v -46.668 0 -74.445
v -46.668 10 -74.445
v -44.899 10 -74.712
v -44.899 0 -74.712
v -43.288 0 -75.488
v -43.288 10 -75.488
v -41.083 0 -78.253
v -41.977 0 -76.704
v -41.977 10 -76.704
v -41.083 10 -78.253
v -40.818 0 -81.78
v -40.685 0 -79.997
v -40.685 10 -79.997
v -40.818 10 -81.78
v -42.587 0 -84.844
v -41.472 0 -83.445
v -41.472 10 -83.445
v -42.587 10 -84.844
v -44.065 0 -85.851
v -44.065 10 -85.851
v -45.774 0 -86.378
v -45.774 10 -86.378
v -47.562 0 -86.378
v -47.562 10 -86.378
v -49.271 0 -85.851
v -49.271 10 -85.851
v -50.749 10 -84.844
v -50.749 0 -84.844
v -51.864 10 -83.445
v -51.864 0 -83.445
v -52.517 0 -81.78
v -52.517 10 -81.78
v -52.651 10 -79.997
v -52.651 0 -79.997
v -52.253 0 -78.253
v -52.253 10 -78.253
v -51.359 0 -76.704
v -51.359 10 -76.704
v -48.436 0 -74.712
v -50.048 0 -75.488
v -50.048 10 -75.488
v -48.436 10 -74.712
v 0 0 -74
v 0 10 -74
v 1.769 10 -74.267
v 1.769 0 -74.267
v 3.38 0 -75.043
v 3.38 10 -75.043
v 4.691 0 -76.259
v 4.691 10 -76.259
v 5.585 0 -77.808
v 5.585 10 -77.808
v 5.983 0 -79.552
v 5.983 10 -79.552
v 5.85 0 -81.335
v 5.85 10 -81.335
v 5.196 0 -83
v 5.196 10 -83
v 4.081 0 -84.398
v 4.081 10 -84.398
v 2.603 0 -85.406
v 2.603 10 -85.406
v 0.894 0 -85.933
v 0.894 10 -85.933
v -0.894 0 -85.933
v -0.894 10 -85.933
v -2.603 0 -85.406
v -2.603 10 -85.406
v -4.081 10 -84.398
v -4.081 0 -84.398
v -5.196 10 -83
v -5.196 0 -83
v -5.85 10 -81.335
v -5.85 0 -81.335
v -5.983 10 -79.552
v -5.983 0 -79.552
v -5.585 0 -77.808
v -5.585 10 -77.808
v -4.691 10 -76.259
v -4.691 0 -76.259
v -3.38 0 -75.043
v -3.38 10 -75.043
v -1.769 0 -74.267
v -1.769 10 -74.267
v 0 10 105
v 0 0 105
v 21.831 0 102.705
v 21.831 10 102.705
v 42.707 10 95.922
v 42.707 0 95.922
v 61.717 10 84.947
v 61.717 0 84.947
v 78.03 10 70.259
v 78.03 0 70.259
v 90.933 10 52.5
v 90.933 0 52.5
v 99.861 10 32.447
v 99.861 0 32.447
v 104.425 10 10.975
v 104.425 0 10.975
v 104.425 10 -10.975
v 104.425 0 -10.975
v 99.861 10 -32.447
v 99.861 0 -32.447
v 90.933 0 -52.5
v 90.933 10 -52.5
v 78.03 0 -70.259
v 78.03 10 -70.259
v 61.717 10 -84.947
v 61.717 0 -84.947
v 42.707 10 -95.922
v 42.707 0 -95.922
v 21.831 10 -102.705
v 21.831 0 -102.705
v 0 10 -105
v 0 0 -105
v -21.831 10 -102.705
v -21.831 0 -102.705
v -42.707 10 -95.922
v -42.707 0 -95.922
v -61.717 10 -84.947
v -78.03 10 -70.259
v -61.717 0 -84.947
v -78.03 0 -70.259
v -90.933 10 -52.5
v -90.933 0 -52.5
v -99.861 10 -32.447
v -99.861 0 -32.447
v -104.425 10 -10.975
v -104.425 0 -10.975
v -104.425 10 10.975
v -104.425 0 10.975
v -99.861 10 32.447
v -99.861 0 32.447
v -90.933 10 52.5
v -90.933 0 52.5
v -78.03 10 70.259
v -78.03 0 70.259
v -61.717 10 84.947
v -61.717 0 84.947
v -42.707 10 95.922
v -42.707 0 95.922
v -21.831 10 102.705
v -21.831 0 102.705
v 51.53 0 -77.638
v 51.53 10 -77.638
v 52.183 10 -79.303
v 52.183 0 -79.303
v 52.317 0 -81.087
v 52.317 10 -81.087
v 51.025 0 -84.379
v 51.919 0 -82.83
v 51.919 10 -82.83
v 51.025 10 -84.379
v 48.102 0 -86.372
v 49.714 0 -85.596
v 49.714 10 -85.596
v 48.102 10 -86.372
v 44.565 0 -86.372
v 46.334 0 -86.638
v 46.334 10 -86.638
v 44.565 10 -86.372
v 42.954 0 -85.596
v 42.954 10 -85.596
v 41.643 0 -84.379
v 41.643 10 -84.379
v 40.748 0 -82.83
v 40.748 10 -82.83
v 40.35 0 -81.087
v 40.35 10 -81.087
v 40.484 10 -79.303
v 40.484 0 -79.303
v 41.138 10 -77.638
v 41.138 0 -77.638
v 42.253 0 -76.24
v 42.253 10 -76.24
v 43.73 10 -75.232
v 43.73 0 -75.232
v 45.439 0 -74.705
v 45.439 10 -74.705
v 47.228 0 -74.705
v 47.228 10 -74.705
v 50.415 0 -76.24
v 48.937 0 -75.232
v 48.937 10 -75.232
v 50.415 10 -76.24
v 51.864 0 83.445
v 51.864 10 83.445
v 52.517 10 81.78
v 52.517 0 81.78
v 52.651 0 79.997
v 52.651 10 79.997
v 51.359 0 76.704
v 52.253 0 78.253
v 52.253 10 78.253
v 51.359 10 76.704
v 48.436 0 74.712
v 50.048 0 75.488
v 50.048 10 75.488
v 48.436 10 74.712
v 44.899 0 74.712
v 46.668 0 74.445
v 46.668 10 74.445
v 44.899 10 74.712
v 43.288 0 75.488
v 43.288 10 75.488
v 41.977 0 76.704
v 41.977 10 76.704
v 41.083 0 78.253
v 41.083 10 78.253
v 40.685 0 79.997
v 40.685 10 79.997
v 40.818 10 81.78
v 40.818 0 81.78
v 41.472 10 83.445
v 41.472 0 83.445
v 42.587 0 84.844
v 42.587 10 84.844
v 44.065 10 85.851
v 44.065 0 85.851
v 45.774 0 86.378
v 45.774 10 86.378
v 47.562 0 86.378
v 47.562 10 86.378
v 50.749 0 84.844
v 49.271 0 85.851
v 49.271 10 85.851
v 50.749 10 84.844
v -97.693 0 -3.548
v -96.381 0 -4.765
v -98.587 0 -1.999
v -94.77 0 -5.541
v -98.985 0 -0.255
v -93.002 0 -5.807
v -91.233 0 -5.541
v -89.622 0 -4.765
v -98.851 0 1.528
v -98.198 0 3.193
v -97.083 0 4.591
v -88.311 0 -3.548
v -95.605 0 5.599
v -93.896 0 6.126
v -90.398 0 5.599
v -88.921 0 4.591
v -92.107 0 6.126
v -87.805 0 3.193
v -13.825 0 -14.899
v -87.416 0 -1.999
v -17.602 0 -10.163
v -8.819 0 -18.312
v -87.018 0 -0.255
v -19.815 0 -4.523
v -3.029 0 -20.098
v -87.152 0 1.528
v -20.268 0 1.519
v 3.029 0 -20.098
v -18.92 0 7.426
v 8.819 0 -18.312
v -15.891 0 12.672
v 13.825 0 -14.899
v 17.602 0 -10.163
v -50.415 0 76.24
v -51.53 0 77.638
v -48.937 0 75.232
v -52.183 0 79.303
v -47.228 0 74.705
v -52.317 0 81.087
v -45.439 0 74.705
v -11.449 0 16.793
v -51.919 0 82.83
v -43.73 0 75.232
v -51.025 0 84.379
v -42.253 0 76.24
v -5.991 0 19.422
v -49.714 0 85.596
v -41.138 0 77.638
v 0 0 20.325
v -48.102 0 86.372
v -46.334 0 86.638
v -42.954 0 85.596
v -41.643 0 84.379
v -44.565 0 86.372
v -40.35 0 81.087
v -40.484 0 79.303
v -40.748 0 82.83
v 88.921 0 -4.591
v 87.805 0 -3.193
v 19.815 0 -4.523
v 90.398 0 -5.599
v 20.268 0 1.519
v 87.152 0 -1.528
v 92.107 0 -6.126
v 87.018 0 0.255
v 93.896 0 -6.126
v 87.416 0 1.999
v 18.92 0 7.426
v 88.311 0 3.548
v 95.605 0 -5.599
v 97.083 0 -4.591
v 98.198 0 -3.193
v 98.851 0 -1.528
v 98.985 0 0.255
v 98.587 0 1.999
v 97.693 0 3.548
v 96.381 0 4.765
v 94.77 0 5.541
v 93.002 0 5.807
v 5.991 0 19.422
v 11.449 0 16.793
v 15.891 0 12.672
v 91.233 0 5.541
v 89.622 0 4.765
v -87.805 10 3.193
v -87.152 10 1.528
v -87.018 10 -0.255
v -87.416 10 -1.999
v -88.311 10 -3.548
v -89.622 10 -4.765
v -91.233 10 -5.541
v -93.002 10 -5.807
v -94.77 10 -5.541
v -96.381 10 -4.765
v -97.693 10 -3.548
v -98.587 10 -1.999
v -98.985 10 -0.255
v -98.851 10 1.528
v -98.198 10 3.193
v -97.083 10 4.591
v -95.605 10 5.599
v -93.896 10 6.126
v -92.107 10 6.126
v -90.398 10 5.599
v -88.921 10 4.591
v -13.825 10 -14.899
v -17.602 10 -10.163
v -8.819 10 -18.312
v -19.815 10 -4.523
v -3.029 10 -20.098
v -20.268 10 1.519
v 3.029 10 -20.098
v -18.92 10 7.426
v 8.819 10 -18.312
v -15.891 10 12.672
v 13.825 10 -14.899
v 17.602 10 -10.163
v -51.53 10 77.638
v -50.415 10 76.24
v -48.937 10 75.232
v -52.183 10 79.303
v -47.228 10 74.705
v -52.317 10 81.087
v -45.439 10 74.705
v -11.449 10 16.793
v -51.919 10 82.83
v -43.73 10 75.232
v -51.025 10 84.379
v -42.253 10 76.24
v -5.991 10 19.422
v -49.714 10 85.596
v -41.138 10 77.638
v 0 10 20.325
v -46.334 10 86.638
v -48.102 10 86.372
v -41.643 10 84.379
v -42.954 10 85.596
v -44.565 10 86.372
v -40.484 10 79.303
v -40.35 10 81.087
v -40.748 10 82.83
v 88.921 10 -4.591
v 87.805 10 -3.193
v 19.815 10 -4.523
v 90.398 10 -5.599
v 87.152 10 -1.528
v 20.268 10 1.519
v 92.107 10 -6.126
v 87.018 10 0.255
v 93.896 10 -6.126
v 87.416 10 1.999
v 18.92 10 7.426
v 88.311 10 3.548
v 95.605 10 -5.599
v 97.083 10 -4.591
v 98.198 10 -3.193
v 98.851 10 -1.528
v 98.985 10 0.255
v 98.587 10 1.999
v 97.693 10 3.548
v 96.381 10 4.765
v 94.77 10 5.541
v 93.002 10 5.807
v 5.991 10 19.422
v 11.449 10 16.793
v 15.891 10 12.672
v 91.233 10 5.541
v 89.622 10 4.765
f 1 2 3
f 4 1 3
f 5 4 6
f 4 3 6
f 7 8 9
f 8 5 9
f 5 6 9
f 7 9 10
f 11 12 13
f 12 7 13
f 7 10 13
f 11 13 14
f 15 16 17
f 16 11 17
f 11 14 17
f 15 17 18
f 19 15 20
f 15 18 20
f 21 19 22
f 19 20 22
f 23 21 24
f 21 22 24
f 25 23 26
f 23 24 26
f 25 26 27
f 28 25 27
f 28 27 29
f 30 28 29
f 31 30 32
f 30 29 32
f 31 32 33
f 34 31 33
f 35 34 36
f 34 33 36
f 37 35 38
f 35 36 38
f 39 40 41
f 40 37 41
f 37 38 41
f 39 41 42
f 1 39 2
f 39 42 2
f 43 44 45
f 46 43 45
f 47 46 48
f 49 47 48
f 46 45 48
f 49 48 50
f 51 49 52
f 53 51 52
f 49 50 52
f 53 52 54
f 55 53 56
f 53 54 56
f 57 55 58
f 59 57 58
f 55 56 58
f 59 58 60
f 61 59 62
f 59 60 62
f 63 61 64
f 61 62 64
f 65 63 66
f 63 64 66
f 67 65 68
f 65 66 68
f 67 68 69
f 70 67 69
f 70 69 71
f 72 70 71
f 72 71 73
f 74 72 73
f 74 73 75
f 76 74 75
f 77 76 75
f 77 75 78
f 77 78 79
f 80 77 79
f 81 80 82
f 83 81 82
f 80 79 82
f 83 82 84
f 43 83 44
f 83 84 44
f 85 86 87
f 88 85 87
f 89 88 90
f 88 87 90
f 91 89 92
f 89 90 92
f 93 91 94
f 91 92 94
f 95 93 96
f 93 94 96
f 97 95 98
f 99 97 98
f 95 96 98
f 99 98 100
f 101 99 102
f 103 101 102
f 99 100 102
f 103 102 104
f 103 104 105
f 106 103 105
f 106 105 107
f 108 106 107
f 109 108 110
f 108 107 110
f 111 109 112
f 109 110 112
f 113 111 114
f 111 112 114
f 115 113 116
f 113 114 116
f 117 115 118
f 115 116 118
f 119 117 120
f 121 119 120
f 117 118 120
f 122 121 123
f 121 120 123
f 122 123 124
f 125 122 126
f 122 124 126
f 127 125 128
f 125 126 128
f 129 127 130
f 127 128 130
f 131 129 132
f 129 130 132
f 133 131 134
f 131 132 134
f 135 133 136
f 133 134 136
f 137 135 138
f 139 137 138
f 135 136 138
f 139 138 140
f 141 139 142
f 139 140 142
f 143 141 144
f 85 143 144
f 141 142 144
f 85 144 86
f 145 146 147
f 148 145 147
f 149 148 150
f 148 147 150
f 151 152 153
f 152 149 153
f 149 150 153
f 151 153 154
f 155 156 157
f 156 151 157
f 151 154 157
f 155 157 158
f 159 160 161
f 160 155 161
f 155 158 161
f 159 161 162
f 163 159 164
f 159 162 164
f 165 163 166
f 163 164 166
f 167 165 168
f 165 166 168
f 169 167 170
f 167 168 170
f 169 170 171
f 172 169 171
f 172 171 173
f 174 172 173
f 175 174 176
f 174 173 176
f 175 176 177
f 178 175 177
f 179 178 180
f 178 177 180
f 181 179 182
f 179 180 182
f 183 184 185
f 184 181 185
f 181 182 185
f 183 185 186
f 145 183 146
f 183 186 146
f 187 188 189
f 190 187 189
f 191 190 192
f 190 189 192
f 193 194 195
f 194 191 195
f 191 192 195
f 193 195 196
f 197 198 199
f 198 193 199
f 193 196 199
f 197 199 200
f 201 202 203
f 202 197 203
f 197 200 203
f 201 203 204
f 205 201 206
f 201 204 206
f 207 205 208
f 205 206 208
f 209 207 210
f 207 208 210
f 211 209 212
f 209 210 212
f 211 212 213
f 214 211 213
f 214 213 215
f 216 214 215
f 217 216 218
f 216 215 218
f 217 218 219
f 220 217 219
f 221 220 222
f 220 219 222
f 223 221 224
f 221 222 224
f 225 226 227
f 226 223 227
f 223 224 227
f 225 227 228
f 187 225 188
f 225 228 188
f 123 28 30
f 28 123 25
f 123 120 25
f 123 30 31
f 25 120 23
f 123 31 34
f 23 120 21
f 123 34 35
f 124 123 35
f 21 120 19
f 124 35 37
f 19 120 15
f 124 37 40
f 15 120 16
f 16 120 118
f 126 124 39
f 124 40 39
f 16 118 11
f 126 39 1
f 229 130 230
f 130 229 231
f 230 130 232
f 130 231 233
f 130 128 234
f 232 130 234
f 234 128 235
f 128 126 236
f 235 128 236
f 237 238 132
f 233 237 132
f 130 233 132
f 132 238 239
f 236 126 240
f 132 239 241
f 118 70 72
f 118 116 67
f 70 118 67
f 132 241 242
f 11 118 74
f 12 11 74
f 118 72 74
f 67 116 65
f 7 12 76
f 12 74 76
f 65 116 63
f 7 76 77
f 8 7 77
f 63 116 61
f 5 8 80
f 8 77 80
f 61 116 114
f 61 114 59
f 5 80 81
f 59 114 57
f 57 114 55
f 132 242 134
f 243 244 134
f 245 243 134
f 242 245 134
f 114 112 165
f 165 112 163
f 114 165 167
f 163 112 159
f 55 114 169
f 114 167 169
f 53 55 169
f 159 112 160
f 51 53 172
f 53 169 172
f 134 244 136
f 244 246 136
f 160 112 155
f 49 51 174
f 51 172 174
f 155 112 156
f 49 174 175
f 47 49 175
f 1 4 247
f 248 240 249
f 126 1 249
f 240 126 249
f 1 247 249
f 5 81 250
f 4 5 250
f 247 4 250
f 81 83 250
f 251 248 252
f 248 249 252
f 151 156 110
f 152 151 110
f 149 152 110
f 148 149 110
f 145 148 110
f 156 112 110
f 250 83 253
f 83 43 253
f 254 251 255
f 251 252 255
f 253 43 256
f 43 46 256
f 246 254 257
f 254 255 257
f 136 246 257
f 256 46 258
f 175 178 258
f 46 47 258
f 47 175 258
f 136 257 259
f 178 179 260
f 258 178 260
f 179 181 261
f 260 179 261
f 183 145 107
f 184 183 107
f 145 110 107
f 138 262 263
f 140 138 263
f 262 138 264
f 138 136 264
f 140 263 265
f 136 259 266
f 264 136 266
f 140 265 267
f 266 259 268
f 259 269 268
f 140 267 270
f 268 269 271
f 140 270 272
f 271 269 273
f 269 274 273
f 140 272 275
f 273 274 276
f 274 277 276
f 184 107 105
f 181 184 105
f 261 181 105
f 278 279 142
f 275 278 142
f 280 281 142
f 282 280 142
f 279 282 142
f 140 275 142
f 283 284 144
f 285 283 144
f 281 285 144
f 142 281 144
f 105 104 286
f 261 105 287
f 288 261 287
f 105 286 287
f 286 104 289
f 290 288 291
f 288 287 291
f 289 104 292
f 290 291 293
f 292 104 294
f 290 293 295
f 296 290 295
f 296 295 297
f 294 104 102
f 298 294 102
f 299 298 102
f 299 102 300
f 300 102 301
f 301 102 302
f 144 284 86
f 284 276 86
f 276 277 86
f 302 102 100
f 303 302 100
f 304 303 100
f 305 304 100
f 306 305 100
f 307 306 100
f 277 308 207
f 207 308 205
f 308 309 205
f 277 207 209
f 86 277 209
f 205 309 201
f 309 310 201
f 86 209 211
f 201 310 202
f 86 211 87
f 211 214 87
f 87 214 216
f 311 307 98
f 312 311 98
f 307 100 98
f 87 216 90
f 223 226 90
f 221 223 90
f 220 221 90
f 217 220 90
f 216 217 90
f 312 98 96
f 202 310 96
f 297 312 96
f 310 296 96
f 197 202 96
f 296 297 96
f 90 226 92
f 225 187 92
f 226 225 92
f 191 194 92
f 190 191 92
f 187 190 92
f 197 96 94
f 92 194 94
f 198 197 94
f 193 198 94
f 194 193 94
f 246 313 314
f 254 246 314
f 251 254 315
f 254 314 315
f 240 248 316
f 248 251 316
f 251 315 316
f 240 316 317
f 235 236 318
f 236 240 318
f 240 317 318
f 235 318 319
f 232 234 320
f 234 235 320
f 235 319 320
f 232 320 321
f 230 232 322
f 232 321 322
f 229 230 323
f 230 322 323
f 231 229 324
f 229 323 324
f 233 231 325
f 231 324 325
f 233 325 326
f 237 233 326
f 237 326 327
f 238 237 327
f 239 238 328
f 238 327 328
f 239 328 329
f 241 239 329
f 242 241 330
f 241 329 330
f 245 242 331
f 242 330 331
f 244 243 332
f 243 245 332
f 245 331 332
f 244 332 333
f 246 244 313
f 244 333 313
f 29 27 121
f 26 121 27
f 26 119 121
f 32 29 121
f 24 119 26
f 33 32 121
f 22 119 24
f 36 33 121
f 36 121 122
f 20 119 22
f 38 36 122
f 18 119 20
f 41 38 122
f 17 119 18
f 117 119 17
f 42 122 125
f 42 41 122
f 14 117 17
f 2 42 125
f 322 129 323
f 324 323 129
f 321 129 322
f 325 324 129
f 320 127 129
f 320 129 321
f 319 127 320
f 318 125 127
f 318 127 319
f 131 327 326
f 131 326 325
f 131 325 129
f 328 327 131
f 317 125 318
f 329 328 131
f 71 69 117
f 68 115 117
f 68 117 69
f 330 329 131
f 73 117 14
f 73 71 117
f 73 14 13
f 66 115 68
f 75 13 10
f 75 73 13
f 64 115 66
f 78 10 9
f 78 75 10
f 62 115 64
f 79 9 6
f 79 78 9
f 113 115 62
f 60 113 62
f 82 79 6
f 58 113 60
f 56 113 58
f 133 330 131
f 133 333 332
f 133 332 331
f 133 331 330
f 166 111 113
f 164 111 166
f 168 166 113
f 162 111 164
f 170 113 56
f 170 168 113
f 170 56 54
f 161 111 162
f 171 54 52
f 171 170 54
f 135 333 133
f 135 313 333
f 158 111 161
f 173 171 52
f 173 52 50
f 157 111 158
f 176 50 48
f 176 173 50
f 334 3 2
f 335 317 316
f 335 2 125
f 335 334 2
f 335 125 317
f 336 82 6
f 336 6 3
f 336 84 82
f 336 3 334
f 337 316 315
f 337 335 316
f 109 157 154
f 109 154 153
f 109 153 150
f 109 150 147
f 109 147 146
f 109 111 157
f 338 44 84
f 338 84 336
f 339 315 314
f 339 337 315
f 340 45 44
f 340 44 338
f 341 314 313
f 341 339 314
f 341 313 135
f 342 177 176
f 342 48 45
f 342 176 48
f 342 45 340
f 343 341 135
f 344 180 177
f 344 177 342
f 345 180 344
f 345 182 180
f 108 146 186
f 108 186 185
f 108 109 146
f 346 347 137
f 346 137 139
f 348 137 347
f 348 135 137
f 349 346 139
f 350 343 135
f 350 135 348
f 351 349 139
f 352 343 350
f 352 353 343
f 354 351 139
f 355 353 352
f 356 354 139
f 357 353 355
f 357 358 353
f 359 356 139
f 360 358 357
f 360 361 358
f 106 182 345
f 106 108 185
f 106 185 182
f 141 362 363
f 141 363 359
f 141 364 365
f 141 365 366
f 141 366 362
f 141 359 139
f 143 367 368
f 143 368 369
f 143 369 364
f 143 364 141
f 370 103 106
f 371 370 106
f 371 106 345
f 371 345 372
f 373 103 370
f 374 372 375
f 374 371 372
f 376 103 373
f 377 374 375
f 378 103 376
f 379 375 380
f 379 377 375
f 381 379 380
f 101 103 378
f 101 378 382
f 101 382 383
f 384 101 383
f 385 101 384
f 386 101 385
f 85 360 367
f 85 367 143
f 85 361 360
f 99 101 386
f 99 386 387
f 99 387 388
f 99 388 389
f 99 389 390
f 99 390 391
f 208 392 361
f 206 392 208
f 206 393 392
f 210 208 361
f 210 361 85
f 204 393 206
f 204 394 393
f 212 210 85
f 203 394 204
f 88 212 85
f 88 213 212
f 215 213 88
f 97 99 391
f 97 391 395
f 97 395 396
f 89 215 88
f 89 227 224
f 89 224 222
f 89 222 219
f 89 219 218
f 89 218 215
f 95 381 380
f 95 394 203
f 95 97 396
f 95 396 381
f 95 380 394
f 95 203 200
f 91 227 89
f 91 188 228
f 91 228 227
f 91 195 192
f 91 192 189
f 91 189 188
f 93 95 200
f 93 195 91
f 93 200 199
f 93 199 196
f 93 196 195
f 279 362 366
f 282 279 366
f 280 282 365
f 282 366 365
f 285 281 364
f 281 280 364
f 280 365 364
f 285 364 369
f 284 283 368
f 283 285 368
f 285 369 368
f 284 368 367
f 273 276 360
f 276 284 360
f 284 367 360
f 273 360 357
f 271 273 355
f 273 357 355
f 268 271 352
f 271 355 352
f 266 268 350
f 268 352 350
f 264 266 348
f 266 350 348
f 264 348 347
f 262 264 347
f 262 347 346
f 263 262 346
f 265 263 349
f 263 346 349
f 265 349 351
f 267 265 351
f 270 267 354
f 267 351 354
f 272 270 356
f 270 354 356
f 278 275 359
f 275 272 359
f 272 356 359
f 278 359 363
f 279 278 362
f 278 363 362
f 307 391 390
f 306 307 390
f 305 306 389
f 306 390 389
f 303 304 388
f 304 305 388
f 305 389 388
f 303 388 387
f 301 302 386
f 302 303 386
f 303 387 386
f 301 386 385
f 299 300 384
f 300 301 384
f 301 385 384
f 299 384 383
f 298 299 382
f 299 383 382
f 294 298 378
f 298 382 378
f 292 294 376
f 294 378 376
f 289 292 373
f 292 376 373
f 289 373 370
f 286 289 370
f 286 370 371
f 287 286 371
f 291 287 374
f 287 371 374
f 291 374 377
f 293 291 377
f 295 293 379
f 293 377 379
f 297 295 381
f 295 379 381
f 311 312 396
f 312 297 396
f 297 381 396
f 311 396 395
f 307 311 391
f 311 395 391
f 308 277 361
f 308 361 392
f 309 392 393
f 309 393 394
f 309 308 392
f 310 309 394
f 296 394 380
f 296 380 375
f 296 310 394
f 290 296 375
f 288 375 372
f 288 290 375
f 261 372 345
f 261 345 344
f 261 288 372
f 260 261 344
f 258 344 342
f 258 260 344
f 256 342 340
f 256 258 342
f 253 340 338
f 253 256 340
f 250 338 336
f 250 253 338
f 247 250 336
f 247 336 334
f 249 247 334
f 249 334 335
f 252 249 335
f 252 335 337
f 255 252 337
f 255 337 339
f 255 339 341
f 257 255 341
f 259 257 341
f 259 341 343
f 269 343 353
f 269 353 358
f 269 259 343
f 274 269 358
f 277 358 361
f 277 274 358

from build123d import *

# Parameters (mm, degrees)
SKETCH1_R           = 105
SKETCH1_R_2         = 20.325
BOSS_EXTRUDE1_DEPTH = 10
SKETCH2_R           = 6
CUT_EXTRUDE1_DEPTH  = 10
CIRPATTERN1_COUNT   = 6
SKETCH4_R           = 6
CUT_EXTRUDE2_DEPTH  = 10


with BuildPart() as part:
    # Sketch1 → Boss-Extrude1 (new body)
    with BuildSketch(Plane(origin=(0, 0, 0), x_dir=(1, 0, 0), z_dir=(0, 1, 0))):
        with Locations(Location((0, 0, 0), (0, 0, 270))):
            Circle(SKETCH1_R)
        with Locations(Location((0, 0, 0), (0, 0, 270))):
            Circle(SKETCH1_R_2, mode=Mode.SUBTRACT)
    extrude(amount=BOSS_EXTRUDE1_DEPTH)

    # Sketch2 → Cut-Extrude1 (cut)
    with BuildSketch(Plane(origin=(0, 10, 0), x_dir=(1, 0, 0), z_dir=(0, 1, 0))):
        with Locations(Location((93.00155101, 0.192929613, 0), (0, 0, 270))):
            Circle(SKETCH2_R)
        with Locations(Location((-46.333693559, -80.638170573, 0), (0, 0, 270))):
            Circle(SKETCH2_R)
        with Locations(Location((-46.667857451, 80.445240959, 0), (0, 0, 270))):
            Circle(SKETCH2_R)
    cut_extrude1 = extrude(amount=-CUT_EXTRUDE1_DEPTH, mode=Mode.SUBTRACT)

    # CirPattern1: Cut-Extrude1 ×6 about axis
    cirpattern1_axis = Axis((0, 0, 0), (0, 1, 0))
    for i in range(1, CIRPATTERN1_COUNT):
        add(cut_extrude1.rotate(cirpattern1_axis, i * 360 / CIRPATTERN1_COUNT), mode=Mode.SUBTRACT)

    # Sketch4 → Cut-Extrude2 (cut)
    with BuildSketch(Plane(origin=(0, 10, 0), x_dir=(1, 0, 0), z_dir=(0, 1, 0))):
        with Locations(Location((0, 80, 0), (0, 0, 270))):
            Circle(SKETCH4_R)
    extrude(amount=-CUT_EXTRUDE2_DEPTH, mode=Mode.SUBTRACT)


solid = part.part
